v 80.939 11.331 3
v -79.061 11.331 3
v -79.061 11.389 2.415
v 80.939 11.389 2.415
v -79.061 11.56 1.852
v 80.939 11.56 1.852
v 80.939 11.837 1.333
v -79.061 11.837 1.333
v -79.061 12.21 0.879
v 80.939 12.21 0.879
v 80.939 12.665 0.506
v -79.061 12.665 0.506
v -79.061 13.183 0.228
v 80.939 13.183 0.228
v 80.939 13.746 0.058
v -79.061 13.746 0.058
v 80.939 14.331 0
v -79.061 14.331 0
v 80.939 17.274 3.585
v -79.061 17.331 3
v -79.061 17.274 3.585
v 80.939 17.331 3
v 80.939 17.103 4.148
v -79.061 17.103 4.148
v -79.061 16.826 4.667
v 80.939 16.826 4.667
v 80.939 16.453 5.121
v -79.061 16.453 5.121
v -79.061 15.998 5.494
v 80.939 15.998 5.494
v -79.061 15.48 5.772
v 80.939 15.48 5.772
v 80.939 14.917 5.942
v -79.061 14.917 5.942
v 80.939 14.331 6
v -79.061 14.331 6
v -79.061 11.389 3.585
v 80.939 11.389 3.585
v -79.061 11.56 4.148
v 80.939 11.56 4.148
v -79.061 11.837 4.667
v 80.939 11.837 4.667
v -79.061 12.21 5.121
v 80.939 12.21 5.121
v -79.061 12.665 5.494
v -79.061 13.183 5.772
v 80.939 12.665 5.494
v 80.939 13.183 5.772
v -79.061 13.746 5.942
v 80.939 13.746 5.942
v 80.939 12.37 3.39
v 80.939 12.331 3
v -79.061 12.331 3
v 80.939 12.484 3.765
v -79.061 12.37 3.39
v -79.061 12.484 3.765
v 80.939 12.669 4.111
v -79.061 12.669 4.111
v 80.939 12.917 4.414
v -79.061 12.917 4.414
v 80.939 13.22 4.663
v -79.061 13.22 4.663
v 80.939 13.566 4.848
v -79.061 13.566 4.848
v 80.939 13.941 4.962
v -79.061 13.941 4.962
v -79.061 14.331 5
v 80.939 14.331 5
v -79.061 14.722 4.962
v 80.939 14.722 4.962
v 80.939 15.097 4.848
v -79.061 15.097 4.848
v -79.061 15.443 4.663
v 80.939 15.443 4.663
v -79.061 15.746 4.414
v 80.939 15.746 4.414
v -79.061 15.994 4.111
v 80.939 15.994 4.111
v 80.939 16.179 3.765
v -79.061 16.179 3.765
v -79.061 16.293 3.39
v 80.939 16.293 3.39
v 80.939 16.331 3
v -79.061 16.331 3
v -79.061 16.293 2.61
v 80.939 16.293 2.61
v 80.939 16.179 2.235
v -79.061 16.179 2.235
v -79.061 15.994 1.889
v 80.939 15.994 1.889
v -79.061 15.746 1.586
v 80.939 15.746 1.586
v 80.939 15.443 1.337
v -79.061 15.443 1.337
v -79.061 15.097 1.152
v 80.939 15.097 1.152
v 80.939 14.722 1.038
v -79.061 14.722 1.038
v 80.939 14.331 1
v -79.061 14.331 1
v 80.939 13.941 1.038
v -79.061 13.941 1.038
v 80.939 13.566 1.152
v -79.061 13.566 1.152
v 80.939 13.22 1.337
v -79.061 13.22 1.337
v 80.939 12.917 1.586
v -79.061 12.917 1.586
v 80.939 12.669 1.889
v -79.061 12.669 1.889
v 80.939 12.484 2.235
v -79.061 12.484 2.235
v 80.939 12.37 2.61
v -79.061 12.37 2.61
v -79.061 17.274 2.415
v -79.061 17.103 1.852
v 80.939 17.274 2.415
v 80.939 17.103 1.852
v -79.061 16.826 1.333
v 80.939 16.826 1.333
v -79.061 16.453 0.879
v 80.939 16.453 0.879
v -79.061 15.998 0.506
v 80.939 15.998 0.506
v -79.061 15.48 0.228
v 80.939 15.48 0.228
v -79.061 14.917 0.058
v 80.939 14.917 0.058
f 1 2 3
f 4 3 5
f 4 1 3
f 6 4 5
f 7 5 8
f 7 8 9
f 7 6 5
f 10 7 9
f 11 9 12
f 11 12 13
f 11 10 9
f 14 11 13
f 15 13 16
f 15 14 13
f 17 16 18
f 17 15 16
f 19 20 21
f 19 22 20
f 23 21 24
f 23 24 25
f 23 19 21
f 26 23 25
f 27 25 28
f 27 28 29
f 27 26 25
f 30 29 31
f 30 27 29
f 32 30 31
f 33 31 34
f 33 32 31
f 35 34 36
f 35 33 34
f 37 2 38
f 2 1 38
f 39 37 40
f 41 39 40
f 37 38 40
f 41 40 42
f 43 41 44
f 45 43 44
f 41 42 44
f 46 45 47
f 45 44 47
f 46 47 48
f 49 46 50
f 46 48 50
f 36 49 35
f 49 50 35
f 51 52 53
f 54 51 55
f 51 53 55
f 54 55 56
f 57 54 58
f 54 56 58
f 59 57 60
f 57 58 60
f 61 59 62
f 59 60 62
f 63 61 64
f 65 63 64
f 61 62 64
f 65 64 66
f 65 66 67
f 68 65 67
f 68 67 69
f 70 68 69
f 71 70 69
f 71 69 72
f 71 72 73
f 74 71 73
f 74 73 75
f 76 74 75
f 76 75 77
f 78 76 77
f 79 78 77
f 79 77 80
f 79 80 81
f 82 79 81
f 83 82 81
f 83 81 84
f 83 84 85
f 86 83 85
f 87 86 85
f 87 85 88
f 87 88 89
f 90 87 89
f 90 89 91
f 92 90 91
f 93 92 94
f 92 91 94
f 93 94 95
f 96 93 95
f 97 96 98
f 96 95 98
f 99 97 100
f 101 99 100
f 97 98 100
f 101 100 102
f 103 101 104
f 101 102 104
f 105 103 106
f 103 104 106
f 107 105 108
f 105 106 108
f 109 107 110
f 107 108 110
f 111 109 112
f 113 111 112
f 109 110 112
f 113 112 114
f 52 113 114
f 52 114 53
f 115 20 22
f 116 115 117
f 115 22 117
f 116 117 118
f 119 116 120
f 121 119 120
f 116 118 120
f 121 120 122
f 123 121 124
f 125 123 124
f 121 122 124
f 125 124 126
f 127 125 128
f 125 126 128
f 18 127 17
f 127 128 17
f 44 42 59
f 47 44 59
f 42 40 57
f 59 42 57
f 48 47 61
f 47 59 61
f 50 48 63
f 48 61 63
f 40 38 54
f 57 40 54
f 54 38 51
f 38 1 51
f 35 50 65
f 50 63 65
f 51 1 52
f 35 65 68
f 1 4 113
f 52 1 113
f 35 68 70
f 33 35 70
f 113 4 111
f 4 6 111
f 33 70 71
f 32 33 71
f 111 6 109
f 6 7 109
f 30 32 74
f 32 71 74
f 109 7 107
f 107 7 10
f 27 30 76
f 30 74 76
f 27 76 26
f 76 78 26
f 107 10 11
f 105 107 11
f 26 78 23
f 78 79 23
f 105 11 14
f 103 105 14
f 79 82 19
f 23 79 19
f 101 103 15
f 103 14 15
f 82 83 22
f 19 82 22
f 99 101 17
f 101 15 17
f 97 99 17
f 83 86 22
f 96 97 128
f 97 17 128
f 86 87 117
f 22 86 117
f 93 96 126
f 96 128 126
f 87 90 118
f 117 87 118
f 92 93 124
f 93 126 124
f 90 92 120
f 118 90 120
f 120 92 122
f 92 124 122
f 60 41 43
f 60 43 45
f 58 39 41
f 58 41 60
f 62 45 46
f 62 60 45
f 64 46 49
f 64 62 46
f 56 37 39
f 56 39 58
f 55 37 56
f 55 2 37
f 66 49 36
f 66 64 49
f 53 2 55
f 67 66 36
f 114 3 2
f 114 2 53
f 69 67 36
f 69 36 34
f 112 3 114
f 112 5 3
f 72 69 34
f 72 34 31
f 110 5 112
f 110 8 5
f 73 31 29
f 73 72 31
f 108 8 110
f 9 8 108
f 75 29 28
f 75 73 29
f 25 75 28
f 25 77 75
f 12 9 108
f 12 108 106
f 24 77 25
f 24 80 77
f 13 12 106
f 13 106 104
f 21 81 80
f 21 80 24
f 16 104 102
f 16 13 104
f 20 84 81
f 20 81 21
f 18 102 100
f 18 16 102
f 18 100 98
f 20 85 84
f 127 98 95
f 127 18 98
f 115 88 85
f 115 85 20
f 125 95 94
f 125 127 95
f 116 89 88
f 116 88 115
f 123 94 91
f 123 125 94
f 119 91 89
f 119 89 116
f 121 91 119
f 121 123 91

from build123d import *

# Parameters (mm, degrees)
F0_W     = 160
F0_H     = 6
F1_DEPTH = 6
F2_R     = 2.99999
F4_D     = 4


# Not quite as in the source:
# - a fillet or chamfer is up to 0.001 mm smaller than in the source, because OpenCascade refuses the exact size


with BuildPart() as f1:
    # F0 (on Top) → F1 (new body)
    with BuildSketch(Plane.XY):
        with Locations((0.9389727563, 14.3314650139)):
            Rectangle(F0_W, F0_H)
    extrude(amount=F1_DEPTH)

    # F2 (radius 3 in the source; OpenCascade refuses exactly that, so slightly less here)
    f2_edges = [f1.edges().sort_by_distance(p)[0] for p in [
        (0.938973, 17.331465, 6),
        (0.938973, 11.331465, 6),
        (0.938973, 17.331465, 0),
        (0.938973, 11.331465, 0),
    ]]
    fillet(f2_edges, radius=F2_R)

    # F4 (through all)
    with Locations(Plane.YZ.offset(80.9389727563)):
        with Locations((14.3314650139, 3)):
            Hole(F4_D / 2)


solid = f1.part
